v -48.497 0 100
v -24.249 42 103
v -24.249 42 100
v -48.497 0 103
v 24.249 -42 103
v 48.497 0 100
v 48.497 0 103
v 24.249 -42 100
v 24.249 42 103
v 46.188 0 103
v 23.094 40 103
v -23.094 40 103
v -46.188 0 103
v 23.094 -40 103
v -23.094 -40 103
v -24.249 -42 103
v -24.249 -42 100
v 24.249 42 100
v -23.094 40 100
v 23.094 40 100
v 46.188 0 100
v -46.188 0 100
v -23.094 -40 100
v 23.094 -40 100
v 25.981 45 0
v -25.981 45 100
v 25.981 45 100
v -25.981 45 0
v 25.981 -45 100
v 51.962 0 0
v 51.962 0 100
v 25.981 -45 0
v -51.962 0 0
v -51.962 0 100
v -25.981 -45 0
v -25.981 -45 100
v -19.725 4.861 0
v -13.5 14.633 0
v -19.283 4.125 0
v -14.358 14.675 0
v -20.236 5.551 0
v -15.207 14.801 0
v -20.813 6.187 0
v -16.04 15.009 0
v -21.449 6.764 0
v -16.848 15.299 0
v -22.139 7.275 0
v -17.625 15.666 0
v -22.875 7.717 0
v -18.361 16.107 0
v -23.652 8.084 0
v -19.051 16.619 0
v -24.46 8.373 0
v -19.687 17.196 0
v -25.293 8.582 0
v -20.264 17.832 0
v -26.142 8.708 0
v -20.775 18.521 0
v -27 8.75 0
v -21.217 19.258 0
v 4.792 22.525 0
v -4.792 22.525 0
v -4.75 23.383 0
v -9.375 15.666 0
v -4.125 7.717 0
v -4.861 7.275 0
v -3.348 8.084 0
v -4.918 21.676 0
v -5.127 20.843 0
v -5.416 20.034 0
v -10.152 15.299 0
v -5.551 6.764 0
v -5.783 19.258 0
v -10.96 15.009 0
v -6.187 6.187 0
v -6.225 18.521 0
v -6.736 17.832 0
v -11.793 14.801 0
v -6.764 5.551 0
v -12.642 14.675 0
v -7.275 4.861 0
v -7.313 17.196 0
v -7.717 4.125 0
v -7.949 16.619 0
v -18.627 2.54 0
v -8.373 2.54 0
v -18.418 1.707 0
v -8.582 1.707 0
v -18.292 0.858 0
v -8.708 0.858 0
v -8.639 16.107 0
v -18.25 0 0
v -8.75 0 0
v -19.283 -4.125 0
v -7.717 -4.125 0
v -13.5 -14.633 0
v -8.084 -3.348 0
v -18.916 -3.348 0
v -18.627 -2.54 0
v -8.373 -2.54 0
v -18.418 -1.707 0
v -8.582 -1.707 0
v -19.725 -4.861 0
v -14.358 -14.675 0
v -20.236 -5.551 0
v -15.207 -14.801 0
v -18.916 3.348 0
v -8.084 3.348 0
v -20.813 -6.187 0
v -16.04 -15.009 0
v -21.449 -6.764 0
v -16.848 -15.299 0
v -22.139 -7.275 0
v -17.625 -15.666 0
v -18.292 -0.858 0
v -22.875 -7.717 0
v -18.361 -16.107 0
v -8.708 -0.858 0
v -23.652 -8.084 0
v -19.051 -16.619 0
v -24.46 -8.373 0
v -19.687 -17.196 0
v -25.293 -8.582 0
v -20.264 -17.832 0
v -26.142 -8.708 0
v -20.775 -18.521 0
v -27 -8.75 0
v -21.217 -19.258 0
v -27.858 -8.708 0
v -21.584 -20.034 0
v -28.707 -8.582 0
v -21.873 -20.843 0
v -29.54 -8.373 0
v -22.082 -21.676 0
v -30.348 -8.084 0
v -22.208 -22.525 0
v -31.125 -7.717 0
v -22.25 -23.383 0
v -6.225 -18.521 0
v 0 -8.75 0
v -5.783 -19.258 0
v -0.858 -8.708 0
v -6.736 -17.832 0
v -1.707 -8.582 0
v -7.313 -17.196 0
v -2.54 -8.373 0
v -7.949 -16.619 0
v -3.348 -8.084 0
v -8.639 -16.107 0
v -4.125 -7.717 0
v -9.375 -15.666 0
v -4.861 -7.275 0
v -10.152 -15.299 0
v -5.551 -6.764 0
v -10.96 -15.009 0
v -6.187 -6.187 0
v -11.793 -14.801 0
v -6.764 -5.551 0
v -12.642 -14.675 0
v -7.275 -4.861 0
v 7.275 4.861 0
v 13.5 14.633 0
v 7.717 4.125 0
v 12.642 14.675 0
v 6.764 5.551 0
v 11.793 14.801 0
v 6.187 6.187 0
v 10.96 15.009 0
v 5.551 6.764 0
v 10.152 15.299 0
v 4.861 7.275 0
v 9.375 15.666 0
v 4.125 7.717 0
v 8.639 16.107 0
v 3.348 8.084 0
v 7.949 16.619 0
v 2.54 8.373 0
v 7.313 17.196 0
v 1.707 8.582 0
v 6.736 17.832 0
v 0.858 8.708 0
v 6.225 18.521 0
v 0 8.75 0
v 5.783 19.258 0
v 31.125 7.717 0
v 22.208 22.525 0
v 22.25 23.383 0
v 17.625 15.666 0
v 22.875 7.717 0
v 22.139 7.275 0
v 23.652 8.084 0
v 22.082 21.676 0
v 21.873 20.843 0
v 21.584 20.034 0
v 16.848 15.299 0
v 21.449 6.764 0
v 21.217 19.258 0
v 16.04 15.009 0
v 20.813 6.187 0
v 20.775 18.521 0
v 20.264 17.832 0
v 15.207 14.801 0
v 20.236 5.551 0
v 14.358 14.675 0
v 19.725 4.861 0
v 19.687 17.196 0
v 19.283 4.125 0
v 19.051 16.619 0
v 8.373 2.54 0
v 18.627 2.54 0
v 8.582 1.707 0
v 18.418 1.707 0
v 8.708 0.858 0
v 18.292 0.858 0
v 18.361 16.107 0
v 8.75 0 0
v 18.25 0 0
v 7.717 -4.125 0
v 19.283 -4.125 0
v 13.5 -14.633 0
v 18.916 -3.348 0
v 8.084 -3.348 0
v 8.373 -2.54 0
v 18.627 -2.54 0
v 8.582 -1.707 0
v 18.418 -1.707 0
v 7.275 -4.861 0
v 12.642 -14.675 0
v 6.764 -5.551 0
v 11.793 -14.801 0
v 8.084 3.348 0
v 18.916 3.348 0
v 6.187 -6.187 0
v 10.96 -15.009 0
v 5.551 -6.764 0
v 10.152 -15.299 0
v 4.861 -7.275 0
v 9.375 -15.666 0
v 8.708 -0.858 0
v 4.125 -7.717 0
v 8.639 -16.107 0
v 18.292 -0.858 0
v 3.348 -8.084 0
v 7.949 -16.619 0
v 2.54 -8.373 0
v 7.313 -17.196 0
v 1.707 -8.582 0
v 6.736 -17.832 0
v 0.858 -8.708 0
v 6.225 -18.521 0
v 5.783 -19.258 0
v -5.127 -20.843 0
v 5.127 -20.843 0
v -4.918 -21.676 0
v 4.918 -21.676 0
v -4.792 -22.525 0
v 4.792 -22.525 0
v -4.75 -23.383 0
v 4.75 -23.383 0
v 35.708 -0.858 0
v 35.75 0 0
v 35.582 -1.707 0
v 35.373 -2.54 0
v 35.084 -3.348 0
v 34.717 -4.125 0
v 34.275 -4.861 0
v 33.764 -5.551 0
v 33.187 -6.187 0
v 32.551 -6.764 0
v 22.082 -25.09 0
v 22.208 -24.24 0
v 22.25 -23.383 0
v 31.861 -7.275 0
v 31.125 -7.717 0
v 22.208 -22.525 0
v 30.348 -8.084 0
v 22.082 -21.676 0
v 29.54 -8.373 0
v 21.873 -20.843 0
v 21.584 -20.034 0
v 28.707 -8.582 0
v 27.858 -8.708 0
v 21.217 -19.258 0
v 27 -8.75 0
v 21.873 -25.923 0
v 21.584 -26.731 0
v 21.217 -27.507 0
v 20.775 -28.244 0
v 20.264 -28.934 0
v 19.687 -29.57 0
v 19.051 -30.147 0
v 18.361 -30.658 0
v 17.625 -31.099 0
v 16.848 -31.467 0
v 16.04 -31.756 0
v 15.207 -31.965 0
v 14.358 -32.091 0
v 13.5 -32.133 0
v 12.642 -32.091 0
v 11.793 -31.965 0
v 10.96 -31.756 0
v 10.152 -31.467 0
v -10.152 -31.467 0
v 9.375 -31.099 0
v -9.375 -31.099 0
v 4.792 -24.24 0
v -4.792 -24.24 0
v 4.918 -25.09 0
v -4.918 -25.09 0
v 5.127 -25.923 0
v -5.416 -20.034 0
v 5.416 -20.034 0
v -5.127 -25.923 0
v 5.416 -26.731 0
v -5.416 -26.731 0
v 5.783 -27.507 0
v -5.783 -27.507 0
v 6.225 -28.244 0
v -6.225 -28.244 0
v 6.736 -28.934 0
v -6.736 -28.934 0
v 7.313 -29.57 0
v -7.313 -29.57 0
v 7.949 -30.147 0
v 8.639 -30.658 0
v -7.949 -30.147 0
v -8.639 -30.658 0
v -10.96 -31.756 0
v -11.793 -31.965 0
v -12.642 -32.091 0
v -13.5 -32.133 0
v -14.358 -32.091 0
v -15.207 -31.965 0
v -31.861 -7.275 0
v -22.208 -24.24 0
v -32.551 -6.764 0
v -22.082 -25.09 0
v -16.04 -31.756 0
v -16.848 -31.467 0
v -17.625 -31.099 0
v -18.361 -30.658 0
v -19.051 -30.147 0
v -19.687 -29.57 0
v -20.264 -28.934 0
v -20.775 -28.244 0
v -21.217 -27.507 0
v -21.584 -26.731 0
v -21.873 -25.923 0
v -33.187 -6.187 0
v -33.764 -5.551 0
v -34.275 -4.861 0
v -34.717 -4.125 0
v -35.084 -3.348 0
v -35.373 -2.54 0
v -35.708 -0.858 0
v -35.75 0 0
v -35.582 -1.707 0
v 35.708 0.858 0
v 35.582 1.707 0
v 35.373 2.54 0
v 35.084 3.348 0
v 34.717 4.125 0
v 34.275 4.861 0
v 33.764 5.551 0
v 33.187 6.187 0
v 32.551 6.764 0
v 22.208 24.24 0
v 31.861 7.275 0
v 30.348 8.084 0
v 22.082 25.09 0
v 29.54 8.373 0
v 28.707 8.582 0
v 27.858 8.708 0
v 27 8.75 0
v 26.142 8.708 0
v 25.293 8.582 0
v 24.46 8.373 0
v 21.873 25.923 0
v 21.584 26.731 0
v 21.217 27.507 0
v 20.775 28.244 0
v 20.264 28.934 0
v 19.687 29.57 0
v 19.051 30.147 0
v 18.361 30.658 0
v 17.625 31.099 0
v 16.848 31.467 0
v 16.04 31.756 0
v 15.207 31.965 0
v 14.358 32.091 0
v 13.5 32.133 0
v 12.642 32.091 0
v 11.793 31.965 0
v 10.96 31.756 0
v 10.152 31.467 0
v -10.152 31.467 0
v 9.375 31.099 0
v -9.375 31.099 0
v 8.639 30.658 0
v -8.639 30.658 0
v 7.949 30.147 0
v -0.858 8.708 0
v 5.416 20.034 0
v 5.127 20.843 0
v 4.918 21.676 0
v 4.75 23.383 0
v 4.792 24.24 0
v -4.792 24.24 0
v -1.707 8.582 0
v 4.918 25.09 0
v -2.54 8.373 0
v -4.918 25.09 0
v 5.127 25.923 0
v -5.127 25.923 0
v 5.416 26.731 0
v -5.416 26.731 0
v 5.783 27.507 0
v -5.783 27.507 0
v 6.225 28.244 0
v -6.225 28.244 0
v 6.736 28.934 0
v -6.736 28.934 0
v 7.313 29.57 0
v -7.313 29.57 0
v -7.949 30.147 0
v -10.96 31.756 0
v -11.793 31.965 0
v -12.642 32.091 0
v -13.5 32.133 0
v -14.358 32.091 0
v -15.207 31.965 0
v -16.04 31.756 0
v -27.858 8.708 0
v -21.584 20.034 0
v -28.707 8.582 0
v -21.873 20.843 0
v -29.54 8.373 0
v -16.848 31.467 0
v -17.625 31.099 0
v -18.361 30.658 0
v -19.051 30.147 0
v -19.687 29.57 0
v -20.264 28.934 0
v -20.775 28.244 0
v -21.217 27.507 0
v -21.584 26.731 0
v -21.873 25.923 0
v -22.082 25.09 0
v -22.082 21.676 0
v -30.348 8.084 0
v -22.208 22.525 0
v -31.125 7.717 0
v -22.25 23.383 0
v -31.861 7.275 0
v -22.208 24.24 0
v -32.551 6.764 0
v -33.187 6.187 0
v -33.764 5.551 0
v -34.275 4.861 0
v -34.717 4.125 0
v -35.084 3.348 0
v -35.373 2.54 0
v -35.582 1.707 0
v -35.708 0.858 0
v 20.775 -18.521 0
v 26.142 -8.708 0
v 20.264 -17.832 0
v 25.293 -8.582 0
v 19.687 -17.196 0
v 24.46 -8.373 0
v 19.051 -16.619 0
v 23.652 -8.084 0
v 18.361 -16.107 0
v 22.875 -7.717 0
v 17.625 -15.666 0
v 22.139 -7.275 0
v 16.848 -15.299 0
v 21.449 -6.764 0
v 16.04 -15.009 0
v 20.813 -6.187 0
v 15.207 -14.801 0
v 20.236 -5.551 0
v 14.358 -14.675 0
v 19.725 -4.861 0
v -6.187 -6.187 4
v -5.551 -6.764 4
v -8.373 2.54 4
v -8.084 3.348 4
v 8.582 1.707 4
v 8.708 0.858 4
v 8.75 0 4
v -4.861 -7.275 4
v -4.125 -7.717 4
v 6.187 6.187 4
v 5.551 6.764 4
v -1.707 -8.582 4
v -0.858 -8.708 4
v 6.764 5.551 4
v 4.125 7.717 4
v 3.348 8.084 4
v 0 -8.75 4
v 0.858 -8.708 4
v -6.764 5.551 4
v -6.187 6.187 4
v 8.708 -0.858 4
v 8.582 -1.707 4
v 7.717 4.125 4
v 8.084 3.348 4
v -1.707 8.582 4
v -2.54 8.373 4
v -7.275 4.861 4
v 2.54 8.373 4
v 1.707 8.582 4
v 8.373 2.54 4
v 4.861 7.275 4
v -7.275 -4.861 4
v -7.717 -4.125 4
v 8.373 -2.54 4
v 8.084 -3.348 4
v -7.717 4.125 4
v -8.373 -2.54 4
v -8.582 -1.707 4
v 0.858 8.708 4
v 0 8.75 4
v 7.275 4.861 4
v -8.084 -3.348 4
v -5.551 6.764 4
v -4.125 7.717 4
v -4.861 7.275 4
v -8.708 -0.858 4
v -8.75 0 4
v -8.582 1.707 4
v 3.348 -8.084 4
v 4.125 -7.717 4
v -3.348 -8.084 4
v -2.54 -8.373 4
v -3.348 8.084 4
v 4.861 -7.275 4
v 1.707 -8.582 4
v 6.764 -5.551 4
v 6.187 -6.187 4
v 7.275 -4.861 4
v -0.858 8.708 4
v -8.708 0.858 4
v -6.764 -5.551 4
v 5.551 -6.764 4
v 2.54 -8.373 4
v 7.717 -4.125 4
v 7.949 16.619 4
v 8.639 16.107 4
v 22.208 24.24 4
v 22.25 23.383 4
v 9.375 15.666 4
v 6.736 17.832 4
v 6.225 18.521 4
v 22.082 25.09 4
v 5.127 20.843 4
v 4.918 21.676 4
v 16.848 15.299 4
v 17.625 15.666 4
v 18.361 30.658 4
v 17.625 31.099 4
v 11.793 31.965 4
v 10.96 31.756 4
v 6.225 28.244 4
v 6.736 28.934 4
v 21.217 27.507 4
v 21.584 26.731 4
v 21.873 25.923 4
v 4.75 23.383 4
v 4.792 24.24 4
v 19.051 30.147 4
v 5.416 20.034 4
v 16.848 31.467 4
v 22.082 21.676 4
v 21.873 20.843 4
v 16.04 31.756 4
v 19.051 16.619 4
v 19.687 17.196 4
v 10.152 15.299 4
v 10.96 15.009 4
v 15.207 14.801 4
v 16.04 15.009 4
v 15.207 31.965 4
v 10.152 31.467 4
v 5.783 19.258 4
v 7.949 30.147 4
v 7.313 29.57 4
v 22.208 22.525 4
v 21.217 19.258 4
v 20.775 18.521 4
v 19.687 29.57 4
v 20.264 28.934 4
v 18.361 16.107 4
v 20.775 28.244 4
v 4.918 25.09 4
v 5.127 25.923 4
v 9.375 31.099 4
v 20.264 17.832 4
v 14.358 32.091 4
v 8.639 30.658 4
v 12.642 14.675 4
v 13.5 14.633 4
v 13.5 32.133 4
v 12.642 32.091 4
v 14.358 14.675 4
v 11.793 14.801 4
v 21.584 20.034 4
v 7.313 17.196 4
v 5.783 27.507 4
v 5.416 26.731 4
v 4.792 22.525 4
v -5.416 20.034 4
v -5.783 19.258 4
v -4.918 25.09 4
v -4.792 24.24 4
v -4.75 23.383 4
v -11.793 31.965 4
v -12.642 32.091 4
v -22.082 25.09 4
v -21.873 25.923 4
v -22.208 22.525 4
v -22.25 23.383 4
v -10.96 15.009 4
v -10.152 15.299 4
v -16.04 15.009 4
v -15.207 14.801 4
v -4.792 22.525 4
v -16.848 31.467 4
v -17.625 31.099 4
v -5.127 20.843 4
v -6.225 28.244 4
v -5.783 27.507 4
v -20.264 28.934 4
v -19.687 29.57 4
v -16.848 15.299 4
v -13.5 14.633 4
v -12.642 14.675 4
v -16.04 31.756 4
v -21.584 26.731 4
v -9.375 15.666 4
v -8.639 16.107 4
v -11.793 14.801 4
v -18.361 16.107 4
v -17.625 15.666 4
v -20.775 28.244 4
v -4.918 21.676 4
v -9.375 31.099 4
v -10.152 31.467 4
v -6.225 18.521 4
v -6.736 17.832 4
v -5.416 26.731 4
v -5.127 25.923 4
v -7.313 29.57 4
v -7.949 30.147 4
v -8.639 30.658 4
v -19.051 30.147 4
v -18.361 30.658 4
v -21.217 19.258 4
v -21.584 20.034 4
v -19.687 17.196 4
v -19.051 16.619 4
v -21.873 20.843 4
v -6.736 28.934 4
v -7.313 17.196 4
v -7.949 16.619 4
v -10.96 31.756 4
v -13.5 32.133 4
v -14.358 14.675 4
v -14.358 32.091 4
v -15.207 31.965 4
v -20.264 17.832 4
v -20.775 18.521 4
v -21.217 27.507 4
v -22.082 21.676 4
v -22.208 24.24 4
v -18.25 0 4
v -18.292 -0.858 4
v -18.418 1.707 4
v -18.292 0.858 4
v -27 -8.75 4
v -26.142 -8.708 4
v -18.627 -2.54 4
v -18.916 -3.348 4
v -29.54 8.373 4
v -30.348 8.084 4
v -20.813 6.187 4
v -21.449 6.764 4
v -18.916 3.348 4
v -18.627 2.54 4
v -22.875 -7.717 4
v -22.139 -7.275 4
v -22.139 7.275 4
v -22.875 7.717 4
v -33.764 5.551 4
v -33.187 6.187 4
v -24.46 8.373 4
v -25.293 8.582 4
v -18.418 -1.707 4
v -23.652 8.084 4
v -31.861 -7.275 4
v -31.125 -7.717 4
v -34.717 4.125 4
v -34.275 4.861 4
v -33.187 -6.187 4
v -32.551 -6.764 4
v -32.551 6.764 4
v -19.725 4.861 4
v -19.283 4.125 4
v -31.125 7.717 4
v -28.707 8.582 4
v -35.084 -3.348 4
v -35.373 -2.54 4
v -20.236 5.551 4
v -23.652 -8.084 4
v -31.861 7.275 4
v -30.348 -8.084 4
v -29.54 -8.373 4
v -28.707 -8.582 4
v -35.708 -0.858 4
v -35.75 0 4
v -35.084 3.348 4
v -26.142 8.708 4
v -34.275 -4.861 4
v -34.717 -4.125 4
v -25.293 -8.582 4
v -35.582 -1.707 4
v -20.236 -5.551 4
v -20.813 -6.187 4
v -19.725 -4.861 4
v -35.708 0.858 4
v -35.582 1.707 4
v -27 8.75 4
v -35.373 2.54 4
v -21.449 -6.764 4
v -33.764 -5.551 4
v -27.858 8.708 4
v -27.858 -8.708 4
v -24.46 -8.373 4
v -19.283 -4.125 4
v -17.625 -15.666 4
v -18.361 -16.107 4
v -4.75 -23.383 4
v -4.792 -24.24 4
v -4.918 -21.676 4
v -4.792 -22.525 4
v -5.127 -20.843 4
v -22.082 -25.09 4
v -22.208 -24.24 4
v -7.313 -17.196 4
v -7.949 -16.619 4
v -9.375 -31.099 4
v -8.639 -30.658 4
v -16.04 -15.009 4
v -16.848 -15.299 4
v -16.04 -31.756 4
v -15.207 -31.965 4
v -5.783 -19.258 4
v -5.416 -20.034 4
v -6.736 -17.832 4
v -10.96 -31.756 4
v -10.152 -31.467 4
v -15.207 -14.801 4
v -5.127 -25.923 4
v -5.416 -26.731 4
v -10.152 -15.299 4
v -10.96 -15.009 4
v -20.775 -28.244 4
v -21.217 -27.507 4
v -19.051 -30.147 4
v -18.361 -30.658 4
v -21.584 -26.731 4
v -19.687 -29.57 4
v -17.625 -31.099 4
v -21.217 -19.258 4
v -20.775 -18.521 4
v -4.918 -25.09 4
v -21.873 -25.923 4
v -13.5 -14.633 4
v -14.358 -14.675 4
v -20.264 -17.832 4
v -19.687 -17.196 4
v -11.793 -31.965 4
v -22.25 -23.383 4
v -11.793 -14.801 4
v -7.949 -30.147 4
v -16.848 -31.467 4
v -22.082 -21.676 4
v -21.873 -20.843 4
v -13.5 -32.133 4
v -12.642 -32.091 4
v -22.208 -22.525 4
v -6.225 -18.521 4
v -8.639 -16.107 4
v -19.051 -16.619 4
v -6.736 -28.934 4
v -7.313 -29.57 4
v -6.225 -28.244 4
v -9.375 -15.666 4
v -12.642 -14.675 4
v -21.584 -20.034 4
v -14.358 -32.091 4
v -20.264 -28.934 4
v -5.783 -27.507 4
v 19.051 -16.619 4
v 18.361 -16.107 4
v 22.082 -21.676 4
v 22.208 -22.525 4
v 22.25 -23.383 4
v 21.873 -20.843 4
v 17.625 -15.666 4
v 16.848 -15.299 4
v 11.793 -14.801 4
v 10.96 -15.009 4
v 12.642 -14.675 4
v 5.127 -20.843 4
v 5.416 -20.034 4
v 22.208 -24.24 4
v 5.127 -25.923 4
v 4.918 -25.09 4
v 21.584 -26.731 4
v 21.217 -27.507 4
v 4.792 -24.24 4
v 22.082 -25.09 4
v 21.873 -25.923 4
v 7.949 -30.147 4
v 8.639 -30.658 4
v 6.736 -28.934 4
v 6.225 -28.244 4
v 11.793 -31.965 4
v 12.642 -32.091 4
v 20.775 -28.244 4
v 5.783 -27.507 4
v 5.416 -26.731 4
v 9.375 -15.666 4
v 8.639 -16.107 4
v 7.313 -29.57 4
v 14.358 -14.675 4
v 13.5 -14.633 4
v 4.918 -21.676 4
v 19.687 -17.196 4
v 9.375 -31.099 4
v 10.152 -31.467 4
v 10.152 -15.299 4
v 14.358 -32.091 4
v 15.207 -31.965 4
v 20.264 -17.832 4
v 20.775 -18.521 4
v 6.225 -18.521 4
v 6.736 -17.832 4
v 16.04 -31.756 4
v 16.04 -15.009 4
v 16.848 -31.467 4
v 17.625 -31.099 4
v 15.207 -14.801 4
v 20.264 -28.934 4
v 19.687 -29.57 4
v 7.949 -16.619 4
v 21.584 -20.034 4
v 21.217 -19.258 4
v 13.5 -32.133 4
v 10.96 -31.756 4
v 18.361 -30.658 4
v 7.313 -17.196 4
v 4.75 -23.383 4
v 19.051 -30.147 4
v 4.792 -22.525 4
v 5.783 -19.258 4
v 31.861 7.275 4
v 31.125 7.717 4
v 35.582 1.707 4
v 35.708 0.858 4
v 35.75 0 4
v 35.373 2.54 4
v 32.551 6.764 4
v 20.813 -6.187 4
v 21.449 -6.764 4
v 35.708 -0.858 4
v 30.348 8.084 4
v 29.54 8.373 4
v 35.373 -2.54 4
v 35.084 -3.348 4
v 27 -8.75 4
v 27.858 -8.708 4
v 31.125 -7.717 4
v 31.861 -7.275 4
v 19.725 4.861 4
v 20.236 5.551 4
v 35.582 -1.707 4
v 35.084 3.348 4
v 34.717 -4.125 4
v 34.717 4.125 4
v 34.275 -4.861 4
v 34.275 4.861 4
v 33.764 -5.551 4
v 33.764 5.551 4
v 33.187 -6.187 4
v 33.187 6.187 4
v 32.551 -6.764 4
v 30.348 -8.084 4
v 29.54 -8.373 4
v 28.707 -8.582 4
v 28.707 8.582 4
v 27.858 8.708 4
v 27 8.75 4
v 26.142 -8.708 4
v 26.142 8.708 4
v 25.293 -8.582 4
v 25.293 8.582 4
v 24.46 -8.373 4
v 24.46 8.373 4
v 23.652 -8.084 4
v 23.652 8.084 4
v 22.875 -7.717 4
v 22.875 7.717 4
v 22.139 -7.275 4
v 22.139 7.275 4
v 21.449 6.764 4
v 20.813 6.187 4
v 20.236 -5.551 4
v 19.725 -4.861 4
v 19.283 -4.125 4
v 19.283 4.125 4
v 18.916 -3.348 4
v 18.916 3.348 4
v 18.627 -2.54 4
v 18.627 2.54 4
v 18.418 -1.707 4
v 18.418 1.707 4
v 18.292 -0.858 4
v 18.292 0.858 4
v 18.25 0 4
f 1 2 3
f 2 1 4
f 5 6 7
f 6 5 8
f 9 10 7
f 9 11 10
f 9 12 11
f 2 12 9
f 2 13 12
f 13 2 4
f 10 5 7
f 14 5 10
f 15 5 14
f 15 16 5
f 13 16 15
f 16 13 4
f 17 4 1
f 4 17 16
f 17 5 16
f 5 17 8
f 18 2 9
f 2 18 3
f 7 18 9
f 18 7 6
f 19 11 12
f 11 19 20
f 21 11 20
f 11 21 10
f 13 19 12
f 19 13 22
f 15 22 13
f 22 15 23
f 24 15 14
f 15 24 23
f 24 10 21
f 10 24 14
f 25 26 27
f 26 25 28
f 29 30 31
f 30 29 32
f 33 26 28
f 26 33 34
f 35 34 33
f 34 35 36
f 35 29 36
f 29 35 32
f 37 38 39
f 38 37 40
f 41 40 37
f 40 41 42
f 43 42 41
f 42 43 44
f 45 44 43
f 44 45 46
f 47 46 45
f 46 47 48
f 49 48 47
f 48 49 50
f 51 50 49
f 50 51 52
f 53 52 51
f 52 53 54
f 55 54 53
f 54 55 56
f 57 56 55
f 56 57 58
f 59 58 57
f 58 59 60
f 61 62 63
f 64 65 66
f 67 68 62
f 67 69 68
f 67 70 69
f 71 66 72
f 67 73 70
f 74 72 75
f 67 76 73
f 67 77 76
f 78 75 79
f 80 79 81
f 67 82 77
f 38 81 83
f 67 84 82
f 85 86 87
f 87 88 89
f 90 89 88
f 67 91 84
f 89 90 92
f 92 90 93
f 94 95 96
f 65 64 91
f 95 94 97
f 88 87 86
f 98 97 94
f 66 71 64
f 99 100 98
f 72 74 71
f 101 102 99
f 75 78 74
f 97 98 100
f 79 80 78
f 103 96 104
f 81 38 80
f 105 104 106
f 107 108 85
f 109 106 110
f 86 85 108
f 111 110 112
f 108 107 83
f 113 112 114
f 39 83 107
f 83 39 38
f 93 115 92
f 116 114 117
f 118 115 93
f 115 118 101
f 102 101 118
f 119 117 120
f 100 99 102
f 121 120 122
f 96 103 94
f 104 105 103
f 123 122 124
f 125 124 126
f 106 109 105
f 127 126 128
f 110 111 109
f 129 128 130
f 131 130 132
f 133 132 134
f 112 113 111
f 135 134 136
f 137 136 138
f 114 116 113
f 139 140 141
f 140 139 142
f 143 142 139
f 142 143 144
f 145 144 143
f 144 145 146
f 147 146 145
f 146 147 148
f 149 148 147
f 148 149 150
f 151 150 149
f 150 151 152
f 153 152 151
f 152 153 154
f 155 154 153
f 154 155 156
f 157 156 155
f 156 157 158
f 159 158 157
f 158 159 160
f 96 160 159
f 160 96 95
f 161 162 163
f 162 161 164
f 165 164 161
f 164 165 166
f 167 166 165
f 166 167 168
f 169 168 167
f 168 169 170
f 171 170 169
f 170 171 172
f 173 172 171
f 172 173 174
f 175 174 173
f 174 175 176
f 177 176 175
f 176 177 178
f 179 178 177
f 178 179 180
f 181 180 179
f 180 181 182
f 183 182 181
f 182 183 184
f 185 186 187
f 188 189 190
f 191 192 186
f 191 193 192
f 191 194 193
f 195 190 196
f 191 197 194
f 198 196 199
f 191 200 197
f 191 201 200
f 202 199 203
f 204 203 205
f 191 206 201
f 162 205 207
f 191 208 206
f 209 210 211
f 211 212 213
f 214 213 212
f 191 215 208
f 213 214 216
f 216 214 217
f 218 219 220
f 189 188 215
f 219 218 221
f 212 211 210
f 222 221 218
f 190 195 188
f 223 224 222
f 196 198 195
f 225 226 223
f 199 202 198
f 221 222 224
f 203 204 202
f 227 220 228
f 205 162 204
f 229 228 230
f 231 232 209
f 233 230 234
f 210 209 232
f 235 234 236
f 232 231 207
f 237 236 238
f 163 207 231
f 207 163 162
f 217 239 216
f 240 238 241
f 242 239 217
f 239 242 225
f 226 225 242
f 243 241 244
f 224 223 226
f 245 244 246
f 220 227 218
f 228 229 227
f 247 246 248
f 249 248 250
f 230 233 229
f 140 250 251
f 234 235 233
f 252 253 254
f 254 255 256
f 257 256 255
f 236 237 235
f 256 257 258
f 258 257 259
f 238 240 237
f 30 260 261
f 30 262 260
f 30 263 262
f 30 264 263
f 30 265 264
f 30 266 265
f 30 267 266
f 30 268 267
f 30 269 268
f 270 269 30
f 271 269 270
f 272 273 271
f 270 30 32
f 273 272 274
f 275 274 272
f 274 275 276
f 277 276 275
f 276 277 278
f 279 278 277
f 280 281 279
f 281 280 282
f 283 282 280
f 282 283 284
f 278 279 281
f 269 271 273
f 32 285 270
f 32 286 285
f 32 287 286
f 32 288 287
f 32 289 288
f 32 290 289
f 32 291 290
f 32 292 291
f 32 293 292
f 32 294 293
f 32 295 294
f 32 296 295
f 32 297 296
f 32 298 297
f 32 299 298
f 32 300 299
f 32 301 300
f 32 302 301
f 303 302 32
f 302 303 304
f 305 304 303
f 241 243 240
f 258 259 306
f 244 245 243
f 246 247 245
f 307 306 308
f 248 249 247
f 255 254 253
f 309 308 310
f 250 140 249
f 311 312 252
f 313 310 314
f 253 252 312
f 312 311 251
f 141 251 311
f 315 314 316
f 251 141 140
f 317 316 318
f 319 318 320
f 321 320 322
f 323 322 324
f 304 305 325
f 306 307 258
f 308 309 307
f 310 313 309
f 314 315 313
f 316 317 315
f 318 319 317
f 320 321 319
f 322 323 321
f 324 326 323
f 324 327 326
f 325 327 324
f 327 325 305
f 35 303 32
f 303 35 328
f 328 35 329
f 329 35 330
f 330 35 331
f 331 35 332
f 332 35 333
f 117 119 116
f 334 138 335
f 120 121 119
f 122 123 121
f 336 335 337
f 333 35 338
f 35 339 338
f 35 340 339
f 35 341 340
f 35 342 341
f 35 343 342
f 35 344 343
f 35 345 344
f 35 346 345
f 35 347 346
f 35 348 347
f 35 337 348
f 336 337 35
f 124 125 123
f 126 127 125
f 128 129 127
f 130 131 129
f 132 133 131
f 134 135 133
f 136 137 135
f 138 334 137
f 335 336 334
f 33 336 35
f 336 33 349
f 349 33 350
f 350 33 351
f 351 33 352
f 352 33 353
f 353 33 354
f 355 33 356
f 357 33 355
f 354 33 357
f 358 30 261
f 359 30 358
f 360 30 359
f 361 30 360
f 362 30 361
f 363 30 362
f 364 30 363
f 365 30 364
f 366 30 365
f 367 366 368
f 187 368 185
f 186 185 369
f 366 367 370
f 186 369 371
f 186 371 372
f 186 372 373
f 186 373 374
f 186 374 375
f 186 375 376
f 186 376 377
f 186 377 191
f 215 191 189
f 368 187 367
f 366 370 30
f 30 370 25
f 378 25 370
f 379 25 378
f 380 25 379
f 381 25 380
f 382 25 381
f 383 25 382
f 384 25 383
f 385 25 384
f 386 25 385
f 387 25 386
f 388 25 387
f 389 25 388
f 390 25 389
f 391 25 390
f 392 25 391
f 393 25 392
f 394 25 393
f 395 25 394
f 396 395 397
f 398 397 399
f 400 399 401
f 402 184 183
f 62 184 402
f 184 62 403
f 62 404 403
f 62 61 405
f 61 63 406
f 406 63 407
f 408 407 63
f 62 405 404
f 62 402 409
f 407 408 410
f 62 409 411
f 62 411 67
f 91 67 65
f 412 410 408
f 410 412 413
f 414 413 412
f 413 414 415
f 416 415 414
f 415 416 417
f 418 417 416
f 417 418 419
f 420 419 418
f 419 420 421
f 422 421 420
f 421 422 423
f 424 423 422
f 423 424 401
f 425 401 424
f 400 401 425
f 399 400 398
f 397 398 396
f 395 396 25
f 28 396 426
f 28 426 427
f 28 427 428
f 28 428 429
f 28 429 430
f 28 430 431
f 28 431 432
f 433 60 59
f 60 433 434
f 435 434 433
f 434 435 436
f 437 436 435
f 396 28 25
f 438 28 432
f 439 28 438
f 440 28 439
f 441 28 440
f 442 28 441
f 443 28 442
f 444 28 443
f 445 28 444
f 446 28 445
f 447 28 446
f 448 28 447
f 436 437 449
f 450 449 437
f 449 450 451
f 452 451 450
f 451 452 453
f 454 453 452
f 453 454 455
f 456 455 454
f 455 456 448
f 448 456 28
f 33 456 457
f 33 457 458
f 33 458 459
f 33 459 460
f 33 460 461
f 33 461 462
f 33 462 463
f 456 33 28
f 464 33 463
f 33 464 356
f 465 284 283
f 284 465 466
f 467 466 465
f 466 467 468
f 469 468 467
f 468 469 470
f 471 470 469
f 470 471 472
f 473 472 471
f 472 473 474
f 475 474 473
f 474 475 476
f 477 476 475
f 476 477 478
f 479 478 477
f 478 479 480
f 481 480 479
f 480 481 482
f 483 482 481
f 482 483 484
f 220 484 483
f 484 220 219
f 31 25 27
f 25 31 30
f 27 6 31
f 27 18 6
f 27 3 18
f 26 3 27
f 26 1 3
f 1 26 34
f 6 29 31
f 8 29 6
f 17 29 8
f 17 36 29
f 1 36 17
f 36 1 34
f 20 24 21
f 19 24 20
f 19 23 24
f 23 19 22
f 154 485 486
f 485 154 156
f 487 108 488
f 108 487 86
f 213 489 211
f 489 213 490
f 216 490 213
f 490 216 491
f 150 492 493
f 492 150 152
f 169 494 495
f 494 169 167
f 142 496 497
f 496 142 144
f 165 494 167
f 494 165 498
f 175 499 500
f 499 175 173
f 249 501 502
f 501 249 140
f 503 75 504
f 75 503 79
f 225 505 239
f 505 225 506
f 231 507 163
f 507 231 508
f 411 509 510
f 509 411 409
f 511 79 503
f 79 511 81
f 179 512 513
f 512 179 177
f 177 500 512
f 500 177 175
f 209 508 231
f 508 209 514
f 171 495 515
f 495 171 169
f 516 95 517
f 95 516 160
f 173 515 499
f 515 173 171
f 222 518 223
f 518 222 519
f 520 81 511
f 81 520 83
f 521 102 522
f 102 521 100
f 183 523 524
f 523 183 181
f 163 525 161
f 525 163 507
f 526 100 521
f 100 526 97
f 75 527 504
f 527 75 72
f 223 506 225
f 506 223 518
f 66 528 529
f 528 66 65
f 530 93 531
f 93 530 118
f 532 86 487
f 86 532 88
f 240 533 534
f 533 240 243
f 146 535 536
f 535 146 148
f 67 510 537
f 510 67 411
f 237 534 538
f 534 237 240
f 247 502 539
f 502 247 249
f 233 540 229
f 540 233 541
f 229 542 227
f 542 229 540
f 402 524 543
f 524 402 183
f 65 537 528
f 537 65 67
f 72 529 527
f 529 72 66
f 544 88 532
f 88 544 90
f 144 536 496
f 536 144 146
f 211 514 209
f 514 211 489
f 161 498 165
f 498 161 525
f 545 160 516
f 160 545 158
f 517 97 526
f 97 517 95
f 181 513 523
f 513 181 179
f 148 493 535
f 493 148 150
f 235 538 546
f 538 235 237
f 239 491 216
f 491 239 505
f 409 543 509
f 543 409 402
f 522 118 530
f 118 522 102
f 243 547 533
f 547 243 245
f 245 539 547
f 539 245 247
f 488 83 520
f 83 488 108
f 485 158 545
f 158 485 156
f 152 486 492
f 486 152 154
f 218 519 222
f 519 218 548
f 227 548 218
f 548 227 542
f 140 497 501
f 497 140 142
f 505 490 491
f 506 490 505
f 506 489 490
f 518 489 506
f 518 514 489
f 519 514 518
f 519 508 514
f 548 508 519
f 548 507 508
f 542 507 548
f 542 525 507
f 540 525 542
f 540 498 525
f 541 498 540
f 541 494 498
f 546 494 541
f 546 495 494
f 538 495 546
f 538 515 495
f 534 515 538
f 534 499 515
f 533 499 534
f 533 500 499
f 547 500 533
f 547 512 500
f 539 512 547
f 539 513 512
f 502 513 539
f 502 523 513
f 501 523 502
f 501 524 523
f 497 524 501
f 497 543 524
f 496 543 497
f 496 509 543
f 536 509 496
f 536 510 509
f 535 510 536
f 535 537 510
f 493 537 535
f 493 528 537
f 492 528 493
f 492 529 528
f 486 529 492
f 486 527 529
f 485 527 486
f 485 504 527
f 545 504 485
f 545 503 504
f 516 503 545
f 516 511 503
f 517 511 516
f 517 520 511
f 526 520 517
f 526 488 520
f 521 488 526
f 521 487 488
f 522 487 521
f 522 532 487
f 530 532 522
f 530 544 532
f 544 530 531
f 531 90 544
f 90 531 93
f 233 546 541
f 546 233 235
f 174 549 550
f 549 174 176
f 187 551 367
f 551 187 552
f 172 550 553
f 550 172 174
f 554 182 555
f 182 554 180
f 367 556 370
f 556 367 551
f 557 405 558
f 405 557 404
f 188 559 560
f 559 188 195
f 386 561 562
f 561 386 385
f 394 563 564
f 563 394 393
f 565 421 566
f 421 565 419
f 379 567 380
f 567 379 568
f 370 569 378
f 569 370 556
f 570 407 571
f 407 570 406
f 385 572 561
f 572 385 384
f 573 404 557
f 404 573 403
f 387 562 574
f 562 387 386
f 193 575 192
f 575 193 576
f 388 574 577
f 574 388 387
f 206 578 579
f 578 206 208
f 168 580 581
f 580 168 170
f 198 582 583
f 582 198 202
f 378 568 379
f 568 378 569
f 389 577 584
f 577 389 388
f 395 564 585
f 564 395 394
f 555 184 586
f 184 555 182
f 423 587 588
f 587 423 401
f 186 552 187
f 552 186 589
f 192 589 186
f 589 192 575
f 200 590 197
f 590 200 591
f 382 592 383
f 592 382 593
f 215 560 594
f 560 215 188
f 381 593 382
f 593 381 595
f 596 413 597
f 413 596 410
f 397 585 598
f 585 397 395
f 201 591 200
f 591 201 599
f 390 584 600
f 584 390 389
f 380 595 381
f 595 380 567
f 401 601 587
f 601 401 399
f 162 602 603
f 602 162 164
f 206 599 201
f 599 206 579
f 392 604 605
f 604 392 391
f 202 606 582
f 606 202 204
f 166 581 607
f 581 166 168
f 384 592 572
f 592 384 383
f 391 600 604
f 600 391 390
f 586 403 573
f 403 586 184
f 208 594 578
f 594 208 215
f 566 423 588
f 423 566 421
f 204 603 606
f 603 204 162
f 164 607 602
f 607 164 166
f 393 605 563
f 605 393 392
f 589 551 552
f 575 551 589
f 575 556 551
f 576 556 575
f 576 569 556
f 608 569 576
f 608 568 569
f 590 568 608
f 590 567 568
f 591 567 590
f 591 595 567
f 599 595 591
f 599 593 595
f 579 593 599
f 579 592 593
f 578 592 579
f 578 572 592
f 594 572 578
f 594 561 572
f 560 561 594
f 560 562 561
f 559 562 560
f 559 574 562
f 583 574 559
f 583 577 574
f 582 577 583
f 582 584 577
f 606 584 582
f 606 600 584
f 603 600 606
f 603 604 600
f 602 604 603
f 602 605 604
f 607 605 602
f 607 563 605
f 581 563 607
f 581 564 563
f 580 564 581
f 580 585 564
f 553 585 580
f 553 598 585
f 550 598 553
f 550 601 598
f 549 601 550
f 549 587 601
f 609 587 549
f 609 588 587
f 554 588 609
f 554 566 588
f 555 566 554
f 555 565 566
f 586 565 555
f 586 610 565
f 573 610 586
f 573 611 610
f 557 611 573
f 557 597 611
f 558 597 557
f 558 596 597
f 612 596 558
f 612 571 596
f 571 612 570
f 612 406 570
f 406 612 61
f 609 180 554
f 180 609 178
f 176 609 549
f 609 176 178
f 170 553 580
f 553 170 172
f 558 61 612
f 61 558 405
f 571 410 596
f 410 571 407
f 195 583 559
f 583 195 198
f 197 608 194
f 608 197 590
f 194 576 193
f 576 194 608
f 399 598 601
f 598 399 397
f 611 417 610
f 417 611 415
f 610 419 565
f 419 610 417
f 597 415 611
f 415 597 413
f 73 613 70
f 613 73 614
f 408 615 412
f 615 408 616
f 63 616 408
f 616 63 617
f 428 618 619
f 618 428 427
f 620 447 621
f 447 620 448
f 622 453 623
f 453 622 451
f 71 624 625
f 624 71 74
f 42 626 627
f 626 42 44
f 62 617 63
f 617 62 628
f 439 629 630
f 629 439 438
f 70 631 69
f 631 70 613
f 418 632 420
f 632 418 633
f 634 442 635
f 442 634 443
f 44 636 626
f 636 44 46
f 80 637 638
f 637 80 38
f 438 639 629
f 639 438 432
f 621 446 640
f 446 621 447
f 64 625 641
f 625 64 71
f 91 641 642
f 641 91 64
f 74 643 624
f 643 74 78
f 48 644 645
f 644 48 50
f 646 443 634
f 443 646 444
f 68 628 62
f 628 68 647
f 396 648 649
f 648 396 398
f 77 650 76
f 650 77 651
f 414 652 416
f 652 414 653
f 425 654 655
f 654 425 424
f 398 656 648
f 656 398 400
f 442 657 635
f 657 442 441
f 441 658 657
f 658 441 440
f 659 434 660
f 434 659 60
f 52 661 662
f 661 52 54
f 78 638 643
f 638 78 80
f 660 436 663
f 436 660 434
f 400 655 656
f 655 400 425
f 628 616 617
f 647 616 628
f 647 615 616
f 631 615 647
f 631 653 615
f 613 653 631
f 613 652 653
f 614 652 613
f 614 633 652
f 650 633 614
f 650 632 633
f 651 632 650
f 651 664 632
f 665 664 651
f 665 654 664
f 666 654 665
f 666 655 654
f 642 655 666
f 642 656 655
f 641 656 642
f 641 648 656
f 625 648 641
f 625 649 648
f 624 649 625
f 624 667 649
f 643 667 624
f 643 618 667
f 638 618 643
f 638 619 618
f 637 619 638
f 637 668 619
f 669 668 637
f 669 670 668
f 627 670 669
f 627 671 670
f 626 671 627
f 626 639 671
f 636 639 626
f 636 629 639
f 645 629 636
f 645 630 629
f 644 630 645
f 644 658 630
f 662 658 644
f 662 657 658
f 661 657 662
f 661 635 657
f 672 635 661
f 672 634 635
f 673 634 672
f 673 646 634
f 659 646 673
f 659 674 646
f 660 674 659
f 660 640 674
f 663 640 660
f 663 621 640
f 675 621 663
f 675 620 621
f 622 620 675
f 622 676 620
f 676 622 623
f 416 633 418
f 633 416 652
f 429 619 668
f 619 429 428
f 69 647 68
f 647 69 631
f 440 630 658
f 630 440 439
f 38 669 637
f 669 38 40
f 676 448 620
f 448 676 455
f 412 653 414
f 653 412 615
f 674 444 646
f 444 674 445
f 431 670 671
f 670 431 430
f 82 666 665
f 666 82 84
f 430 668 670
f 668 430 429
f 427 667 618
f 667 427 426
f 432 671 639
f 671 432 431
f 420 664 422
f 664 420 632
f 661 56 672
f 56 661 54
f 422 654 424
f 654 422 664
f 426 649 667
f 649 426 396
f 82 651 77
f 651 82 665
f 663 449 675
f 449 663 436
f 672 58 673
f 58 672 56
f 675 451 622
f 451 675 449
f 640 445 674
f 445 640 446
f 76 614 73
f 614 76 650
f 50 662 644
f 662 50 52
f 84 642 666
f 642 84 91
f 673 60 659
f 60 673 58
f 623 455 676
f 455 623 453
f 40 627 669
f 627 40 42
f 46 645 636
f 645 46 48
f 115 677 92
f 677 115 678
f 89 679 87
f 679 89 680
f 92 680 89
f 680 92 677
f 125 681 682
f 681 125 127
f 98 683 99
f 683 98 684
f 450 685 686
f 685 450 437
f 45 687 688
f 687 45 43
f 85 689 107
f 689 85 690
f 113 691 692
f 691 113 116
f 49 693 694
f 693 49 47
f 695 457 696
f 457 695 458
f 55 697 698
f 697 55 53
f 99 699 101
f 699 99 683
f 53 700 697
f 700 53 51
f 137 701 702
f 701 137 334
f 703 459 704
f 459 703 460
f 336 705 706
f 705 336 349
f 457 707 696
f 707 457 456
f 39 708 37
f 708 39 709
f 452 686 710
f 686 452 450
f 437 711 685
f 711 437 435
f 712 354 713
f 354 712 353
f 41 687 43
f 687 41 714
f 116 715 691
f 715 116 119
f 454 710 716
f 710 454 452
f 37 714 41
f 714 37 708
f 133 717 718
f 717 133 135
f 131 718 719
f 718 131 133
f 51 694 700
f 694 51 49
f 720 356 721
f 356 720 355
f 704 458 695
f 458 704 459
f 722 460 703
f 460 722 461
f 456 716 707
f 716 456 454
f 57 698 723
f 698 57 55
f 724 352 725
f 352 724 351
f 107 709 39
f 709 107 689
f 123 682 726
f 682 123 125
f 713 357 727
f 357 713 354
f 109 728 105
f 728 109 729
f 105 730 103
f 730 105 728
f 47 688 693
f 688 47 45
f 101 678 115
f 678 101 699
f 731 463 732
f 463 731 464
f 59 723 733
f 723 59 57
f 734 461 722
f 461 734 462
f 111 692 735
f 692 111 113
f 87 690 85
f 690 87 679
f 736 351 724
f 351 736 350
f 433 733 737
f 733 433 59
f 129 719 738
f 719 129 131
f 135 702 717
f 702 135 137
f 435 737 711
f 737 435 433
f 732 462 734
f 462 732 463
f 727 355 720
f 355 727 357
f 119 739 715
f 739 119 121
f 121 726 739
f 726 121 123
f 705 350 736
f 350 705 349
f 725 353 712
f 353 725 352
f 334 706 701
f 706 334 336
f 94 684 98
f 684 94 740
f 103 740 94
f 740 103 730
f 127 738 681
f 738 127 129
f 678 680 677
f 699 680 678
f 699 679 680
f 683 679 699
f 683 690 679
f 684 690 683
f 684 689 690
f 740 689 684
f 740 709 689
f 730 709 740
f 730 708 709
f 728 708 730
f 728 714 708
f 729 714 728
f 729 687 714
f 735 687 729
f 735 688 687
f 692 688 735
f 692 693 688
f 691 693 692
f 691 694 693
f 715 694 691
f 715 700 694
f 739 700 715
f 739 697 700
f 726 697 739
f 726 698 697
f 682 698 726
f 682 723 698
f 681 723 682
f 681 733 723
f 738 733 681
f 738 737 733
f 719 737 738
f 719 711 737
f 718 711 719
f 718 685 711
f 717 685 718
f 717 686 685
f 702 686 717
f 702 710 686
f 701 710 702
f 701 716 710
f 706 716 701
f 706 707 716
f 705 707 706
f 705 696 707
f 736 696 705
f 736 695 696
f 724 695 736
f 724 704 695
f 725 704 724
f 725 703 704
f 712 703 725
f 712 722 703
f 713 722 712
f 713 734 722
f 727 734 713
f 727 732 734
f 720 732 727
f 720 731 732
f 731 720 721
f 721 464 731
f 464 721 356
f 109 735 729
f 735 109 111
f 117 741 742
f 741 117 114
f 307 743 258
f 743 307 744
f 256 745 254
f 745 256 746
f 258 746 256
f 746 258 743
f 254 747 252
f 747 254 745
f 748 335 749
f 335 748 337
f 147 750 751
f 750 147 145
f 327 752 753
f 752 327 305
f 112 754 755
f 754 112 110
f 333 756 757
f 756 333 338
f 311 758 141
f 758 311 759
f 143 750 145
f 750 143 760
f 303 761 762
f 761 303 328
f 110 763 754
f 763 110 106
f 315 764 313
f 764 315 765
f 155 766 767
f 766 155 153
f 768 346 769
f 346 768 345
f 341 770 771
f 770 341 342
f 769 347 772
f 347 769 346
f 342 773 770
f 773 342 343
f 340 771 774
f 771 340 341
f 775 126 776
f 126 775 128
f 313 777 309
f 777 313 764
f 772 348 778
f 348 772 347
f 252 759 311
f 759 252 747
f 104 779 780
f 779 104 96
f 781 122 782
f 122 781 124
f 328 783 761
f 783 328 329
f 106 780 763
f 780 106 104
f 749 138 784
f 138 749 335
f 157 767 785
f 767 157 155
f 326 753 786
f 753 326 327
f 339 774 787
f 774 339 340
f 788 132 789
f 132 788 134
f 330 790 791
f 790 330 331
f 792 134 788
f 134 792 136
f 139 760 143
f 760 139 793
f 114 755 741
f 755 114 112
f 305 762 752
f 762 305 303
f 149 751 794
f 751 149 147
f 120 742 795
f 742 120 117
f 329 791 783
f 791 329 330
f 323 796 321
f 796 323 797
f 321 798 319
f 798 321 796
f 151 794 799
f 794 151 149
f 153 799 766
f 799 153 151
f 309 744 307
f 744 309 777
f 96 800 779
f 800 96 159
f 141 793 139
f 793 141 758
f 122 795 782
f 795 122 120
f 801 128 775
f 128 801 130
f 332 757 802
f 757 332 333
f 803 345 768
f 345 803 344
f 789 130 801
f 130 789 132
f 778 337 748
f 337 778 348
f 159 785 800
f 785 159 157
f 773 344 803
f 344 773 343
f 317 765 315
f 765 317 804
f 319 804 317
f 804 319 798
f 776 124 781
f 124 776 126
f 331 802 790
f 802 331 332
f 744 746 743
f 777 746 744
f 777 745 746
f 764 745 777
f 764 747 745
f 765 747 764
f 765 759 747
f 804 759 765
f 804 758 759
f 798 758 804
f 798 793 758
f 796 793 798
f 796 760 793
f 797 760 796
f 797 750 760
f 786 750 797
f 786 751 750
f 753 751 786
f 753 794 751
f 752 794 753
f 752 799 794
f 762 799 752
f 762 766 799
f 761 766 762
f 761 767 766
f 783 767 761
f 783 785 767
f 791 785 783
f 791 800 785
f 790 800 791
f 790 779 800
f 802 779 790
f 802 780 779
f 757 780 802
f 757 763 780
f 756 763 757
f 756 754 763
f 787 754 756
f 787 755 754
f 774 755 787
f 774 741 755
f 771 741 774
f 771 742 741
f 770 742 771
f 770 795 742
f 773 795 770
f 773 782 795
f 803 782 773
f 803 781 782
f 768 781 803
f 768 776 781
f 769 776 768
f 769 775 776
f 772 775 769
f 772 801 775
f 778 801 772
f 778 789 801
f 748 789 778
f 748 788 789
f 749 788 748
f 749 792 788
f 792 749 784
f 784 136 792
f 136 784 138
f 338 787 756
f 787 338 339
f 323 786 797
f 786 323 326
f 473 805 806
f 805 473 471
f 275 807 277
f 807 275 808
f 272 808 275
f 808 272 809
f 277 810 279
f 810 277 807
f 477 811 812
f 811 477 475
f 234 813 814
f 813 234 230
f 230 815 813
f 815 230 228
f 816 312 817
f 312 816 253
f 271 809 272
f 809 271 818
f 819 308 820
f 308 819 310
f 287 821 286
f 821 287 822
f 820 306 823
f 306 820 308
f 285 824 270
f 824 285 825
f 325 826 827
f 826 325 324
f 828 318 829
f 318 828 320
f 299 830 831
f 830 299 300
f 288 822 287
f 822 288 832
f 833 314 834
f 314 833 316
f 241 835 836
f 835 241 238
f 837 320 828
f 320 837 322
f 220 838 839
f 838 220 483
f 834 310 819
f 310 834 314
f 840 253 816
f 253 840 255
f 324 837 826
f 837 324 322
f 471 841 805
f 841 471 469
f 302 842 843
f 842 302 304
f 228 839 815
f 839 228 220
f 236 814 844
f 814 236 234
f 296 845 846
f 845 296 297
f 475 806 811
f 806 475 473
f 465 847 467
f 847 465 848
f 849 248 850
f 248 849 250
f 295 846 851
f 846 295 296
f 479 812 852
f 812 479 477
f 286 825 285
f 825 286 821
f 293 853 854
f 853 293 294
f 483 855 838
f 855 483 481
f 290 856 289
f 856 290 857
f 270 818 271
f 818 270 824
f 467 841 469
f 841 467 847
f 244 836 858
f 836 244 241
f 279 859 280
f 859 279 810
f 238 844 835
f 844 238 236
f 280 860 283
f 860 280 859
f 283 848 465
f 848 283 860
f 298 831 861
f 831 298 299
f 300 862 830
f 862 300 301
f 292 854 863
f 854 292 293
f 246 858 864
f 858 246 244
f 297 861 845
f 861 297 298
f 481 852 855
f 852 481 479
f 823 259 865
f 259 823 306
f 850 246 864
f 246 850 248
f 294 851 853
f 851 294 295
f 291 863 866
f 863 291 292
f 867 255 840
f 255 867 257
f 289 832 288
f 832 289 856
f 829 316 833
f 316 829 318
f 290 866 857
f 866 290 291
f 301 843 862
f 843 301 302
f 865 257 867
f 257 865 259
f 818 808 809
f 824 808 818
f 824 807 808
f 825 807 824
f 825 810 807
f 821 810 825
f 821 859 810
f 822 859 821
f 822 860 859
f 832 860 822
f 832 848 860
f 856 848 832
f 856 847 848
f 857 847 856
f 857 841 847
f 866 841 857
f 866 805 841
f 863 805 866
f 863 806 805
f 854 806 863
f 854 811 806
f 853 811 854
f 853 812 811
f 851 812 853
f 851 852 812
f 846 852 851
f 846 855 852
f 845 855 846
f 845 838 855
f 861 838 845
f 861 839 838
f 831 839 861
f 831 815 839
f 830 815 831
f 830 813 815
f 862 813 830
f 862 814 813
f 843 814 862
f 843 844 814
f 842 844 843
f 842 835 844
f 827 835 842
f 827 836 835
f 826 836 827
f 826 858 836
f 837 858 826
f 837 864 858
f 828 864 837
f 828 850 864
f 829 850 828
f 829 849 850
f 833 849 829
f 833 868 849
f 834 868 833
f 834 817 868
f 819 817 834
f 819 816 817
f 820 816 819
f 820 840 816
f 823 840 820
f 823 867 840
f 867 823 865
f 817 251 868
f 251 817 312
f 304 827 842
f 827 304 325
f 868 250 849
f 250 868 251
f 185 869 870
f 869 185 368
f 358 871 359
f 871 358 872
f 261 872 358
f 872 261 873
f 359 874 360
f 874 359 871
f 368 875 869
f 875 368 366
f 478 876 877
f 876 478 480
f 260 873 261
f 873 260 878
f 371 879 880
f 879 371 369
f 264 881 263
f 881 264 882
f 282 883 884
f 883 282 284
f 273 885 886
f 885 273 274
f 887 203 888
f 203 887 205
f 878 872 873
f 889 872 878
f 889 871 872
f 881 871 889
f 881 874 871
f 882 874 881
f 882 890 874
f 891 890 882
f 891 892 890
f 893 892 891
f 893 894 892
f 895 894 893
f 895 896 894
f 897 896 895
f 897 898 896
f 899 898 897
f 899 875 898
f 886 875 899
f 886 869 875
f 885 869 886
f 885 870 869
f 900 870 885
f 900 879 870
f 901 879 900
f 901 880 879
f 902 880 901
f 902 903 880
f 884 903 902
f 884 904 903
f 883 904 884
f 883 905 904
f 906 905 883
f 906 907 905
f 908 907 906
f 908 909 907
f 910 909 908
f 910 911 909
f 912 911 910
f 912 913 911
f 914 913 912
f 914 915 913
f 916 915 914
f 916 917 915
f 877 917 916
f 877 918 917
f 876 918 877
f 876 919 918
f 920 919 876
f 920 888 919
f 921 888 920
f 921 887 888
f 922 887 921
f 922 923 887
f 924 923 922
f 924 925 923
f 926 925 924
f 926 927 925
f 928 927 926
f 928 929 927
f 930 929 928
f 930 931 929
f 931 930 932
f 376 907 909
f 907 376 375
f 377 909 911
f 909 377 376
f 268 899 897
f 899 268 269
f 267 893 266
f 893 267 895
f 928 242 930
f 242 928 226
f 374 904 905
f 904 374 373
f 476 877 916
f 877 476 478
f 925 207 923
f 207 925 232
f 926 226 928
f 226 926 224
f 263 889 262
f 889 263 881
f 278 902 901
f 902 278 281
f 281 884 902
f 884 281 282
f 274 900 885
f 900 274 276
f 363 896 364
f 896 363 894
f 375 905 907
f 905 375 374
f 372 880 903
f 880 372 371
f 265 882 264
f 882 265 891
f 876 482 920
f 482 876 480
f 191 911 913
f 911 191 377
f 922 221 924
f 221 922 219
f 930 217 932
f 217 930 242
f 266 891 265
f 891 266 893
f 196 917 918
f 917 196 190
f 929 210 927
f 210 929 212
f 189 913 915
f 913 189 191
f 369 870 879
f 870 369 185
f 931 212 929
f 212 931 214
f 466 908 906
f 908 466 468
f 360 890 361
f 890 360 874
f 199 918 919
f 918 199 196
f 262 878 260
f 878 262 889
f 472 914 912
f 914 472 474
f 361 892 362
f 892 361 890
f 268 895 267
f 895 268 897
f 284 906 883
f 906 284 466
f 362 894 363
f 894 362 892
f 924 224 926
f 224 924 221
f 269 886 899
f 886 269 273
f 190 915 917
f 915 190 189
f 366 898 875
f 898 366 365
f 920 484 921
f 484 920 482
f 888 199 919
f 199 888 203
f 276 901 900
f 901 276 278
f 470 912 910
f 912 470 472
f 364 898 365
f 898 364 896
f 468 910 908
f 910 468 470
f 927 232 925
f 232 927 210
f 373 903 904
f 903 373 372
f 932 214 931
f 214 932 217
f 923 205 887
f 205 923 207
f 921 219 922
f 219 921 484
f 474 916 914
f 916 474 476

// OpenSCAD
// Float for 7 x 15 mL conical tubes, printed upside down.
// Rests on the XY plane at z = 0 and builds upward (+Z).
// Centred on the origin in X and Y.

$fn = 64;

// ---- Plate (flat hexagon, 2 flats parallel to X axis) ----
plate_af = 90;   // across flats (mm)
plate_t  = 3;    // plate thickness (mm)

// ---- Tube sleeves (7 x 17.5 mm holes, 2 mm wall) ----
hole_d   = 17.5; // through-hole diameter (mm)
sleeve_od= 21.5; // sleeve outside diameter (mm)  (17.5 + 2*2)
sleeve_h = 17;   // sleeve height above plate (mm)  -> top at z = 20

// ---- Hexagonal skirt (2 mm wall, sides parallel to plate) ----
skirt_af = 84;   // across flats, outside (mm)  (90 - 2*3)
skirt_t  = 2;    // skirt wall thickness (mm)
skirt_h  = 17;   // skirt height above plate (mm)  -> top at z = 20

// ---- Hole pattern: 1 centre + 6 on a 54 mm circle, 60 deg apart, first on +X ----
ring_d   = 54;   // circle diameter (mm)
ring_r   = ring_d / 2;   // 27 mm

// ---- Helper: regular hexagon, 'across flats' = 2*apothem, two flats parallel to X ----
module hexagon(af) {
    a = af / 2;                 // apothem
    R = a / cos(30);            // circumradius
    pts = [for (i = [0:5]) [R * cos(60 * i), R * sin(60 * i)]];
    polygon(pts);
}

// ---- Helper: one tube sleeve (outer cylinder minus through-hole) ----
module sleeve() {
    difference() {
        cylinder(h = sleeve_h, d = sleeve_od);
        cylinder(h = sleeve_h + 1, d = hole_d);   // 1 mm past top, 1 mm below bottom
    }
}

// ---- Helper: hexagonal skirt (outer hexagon minus inner hexagon) ----
module skirt() {
    difference() {
        linear_extrude(h = skirt_h) hexagon(skirt_af);   // outer, 84 across flats
        linear_extrude(h = skirt_h + 1) hexagon(skirt_af - 2 * skirt_t); // inner, 80 across flats
    }
}

// ---- Build the float ----
difference() {
    union() {
        // Flat hexagonal plate, z = 0 to 3
        linear_extrude(h = plate_t) hexagon(plate_af);

        // Seven sleeves rising from the plate top (z = 3) to z = 20
        translate([0, 0, plate_t]) {
            sleeve();                                   // centre hole
            for (i = [0:5]) {
                translate([ring_r * cos(60 * i), ring_r * sin(60 * i), 0])
                    sleeve();                           // six on 54 mm circle
            }
        }

        // Hexagonal skirt rising from the plate top (z = 3) to z = 20
        translate([0, 0, plate_t]) skirt();
    }

    // Seven 17.5 mm through-holes, cut through the plate only (1 mm past each face)
    for (i = [0:6]) {
        p = (i == 0) ? [0, 0] : [ring_r * cos(60 * i), ring_r * sin(60 * i)];
        translate([p[0], p[1], -1])
            cylinder(h = plate_t + 2, d = hole_d);
    }
}
